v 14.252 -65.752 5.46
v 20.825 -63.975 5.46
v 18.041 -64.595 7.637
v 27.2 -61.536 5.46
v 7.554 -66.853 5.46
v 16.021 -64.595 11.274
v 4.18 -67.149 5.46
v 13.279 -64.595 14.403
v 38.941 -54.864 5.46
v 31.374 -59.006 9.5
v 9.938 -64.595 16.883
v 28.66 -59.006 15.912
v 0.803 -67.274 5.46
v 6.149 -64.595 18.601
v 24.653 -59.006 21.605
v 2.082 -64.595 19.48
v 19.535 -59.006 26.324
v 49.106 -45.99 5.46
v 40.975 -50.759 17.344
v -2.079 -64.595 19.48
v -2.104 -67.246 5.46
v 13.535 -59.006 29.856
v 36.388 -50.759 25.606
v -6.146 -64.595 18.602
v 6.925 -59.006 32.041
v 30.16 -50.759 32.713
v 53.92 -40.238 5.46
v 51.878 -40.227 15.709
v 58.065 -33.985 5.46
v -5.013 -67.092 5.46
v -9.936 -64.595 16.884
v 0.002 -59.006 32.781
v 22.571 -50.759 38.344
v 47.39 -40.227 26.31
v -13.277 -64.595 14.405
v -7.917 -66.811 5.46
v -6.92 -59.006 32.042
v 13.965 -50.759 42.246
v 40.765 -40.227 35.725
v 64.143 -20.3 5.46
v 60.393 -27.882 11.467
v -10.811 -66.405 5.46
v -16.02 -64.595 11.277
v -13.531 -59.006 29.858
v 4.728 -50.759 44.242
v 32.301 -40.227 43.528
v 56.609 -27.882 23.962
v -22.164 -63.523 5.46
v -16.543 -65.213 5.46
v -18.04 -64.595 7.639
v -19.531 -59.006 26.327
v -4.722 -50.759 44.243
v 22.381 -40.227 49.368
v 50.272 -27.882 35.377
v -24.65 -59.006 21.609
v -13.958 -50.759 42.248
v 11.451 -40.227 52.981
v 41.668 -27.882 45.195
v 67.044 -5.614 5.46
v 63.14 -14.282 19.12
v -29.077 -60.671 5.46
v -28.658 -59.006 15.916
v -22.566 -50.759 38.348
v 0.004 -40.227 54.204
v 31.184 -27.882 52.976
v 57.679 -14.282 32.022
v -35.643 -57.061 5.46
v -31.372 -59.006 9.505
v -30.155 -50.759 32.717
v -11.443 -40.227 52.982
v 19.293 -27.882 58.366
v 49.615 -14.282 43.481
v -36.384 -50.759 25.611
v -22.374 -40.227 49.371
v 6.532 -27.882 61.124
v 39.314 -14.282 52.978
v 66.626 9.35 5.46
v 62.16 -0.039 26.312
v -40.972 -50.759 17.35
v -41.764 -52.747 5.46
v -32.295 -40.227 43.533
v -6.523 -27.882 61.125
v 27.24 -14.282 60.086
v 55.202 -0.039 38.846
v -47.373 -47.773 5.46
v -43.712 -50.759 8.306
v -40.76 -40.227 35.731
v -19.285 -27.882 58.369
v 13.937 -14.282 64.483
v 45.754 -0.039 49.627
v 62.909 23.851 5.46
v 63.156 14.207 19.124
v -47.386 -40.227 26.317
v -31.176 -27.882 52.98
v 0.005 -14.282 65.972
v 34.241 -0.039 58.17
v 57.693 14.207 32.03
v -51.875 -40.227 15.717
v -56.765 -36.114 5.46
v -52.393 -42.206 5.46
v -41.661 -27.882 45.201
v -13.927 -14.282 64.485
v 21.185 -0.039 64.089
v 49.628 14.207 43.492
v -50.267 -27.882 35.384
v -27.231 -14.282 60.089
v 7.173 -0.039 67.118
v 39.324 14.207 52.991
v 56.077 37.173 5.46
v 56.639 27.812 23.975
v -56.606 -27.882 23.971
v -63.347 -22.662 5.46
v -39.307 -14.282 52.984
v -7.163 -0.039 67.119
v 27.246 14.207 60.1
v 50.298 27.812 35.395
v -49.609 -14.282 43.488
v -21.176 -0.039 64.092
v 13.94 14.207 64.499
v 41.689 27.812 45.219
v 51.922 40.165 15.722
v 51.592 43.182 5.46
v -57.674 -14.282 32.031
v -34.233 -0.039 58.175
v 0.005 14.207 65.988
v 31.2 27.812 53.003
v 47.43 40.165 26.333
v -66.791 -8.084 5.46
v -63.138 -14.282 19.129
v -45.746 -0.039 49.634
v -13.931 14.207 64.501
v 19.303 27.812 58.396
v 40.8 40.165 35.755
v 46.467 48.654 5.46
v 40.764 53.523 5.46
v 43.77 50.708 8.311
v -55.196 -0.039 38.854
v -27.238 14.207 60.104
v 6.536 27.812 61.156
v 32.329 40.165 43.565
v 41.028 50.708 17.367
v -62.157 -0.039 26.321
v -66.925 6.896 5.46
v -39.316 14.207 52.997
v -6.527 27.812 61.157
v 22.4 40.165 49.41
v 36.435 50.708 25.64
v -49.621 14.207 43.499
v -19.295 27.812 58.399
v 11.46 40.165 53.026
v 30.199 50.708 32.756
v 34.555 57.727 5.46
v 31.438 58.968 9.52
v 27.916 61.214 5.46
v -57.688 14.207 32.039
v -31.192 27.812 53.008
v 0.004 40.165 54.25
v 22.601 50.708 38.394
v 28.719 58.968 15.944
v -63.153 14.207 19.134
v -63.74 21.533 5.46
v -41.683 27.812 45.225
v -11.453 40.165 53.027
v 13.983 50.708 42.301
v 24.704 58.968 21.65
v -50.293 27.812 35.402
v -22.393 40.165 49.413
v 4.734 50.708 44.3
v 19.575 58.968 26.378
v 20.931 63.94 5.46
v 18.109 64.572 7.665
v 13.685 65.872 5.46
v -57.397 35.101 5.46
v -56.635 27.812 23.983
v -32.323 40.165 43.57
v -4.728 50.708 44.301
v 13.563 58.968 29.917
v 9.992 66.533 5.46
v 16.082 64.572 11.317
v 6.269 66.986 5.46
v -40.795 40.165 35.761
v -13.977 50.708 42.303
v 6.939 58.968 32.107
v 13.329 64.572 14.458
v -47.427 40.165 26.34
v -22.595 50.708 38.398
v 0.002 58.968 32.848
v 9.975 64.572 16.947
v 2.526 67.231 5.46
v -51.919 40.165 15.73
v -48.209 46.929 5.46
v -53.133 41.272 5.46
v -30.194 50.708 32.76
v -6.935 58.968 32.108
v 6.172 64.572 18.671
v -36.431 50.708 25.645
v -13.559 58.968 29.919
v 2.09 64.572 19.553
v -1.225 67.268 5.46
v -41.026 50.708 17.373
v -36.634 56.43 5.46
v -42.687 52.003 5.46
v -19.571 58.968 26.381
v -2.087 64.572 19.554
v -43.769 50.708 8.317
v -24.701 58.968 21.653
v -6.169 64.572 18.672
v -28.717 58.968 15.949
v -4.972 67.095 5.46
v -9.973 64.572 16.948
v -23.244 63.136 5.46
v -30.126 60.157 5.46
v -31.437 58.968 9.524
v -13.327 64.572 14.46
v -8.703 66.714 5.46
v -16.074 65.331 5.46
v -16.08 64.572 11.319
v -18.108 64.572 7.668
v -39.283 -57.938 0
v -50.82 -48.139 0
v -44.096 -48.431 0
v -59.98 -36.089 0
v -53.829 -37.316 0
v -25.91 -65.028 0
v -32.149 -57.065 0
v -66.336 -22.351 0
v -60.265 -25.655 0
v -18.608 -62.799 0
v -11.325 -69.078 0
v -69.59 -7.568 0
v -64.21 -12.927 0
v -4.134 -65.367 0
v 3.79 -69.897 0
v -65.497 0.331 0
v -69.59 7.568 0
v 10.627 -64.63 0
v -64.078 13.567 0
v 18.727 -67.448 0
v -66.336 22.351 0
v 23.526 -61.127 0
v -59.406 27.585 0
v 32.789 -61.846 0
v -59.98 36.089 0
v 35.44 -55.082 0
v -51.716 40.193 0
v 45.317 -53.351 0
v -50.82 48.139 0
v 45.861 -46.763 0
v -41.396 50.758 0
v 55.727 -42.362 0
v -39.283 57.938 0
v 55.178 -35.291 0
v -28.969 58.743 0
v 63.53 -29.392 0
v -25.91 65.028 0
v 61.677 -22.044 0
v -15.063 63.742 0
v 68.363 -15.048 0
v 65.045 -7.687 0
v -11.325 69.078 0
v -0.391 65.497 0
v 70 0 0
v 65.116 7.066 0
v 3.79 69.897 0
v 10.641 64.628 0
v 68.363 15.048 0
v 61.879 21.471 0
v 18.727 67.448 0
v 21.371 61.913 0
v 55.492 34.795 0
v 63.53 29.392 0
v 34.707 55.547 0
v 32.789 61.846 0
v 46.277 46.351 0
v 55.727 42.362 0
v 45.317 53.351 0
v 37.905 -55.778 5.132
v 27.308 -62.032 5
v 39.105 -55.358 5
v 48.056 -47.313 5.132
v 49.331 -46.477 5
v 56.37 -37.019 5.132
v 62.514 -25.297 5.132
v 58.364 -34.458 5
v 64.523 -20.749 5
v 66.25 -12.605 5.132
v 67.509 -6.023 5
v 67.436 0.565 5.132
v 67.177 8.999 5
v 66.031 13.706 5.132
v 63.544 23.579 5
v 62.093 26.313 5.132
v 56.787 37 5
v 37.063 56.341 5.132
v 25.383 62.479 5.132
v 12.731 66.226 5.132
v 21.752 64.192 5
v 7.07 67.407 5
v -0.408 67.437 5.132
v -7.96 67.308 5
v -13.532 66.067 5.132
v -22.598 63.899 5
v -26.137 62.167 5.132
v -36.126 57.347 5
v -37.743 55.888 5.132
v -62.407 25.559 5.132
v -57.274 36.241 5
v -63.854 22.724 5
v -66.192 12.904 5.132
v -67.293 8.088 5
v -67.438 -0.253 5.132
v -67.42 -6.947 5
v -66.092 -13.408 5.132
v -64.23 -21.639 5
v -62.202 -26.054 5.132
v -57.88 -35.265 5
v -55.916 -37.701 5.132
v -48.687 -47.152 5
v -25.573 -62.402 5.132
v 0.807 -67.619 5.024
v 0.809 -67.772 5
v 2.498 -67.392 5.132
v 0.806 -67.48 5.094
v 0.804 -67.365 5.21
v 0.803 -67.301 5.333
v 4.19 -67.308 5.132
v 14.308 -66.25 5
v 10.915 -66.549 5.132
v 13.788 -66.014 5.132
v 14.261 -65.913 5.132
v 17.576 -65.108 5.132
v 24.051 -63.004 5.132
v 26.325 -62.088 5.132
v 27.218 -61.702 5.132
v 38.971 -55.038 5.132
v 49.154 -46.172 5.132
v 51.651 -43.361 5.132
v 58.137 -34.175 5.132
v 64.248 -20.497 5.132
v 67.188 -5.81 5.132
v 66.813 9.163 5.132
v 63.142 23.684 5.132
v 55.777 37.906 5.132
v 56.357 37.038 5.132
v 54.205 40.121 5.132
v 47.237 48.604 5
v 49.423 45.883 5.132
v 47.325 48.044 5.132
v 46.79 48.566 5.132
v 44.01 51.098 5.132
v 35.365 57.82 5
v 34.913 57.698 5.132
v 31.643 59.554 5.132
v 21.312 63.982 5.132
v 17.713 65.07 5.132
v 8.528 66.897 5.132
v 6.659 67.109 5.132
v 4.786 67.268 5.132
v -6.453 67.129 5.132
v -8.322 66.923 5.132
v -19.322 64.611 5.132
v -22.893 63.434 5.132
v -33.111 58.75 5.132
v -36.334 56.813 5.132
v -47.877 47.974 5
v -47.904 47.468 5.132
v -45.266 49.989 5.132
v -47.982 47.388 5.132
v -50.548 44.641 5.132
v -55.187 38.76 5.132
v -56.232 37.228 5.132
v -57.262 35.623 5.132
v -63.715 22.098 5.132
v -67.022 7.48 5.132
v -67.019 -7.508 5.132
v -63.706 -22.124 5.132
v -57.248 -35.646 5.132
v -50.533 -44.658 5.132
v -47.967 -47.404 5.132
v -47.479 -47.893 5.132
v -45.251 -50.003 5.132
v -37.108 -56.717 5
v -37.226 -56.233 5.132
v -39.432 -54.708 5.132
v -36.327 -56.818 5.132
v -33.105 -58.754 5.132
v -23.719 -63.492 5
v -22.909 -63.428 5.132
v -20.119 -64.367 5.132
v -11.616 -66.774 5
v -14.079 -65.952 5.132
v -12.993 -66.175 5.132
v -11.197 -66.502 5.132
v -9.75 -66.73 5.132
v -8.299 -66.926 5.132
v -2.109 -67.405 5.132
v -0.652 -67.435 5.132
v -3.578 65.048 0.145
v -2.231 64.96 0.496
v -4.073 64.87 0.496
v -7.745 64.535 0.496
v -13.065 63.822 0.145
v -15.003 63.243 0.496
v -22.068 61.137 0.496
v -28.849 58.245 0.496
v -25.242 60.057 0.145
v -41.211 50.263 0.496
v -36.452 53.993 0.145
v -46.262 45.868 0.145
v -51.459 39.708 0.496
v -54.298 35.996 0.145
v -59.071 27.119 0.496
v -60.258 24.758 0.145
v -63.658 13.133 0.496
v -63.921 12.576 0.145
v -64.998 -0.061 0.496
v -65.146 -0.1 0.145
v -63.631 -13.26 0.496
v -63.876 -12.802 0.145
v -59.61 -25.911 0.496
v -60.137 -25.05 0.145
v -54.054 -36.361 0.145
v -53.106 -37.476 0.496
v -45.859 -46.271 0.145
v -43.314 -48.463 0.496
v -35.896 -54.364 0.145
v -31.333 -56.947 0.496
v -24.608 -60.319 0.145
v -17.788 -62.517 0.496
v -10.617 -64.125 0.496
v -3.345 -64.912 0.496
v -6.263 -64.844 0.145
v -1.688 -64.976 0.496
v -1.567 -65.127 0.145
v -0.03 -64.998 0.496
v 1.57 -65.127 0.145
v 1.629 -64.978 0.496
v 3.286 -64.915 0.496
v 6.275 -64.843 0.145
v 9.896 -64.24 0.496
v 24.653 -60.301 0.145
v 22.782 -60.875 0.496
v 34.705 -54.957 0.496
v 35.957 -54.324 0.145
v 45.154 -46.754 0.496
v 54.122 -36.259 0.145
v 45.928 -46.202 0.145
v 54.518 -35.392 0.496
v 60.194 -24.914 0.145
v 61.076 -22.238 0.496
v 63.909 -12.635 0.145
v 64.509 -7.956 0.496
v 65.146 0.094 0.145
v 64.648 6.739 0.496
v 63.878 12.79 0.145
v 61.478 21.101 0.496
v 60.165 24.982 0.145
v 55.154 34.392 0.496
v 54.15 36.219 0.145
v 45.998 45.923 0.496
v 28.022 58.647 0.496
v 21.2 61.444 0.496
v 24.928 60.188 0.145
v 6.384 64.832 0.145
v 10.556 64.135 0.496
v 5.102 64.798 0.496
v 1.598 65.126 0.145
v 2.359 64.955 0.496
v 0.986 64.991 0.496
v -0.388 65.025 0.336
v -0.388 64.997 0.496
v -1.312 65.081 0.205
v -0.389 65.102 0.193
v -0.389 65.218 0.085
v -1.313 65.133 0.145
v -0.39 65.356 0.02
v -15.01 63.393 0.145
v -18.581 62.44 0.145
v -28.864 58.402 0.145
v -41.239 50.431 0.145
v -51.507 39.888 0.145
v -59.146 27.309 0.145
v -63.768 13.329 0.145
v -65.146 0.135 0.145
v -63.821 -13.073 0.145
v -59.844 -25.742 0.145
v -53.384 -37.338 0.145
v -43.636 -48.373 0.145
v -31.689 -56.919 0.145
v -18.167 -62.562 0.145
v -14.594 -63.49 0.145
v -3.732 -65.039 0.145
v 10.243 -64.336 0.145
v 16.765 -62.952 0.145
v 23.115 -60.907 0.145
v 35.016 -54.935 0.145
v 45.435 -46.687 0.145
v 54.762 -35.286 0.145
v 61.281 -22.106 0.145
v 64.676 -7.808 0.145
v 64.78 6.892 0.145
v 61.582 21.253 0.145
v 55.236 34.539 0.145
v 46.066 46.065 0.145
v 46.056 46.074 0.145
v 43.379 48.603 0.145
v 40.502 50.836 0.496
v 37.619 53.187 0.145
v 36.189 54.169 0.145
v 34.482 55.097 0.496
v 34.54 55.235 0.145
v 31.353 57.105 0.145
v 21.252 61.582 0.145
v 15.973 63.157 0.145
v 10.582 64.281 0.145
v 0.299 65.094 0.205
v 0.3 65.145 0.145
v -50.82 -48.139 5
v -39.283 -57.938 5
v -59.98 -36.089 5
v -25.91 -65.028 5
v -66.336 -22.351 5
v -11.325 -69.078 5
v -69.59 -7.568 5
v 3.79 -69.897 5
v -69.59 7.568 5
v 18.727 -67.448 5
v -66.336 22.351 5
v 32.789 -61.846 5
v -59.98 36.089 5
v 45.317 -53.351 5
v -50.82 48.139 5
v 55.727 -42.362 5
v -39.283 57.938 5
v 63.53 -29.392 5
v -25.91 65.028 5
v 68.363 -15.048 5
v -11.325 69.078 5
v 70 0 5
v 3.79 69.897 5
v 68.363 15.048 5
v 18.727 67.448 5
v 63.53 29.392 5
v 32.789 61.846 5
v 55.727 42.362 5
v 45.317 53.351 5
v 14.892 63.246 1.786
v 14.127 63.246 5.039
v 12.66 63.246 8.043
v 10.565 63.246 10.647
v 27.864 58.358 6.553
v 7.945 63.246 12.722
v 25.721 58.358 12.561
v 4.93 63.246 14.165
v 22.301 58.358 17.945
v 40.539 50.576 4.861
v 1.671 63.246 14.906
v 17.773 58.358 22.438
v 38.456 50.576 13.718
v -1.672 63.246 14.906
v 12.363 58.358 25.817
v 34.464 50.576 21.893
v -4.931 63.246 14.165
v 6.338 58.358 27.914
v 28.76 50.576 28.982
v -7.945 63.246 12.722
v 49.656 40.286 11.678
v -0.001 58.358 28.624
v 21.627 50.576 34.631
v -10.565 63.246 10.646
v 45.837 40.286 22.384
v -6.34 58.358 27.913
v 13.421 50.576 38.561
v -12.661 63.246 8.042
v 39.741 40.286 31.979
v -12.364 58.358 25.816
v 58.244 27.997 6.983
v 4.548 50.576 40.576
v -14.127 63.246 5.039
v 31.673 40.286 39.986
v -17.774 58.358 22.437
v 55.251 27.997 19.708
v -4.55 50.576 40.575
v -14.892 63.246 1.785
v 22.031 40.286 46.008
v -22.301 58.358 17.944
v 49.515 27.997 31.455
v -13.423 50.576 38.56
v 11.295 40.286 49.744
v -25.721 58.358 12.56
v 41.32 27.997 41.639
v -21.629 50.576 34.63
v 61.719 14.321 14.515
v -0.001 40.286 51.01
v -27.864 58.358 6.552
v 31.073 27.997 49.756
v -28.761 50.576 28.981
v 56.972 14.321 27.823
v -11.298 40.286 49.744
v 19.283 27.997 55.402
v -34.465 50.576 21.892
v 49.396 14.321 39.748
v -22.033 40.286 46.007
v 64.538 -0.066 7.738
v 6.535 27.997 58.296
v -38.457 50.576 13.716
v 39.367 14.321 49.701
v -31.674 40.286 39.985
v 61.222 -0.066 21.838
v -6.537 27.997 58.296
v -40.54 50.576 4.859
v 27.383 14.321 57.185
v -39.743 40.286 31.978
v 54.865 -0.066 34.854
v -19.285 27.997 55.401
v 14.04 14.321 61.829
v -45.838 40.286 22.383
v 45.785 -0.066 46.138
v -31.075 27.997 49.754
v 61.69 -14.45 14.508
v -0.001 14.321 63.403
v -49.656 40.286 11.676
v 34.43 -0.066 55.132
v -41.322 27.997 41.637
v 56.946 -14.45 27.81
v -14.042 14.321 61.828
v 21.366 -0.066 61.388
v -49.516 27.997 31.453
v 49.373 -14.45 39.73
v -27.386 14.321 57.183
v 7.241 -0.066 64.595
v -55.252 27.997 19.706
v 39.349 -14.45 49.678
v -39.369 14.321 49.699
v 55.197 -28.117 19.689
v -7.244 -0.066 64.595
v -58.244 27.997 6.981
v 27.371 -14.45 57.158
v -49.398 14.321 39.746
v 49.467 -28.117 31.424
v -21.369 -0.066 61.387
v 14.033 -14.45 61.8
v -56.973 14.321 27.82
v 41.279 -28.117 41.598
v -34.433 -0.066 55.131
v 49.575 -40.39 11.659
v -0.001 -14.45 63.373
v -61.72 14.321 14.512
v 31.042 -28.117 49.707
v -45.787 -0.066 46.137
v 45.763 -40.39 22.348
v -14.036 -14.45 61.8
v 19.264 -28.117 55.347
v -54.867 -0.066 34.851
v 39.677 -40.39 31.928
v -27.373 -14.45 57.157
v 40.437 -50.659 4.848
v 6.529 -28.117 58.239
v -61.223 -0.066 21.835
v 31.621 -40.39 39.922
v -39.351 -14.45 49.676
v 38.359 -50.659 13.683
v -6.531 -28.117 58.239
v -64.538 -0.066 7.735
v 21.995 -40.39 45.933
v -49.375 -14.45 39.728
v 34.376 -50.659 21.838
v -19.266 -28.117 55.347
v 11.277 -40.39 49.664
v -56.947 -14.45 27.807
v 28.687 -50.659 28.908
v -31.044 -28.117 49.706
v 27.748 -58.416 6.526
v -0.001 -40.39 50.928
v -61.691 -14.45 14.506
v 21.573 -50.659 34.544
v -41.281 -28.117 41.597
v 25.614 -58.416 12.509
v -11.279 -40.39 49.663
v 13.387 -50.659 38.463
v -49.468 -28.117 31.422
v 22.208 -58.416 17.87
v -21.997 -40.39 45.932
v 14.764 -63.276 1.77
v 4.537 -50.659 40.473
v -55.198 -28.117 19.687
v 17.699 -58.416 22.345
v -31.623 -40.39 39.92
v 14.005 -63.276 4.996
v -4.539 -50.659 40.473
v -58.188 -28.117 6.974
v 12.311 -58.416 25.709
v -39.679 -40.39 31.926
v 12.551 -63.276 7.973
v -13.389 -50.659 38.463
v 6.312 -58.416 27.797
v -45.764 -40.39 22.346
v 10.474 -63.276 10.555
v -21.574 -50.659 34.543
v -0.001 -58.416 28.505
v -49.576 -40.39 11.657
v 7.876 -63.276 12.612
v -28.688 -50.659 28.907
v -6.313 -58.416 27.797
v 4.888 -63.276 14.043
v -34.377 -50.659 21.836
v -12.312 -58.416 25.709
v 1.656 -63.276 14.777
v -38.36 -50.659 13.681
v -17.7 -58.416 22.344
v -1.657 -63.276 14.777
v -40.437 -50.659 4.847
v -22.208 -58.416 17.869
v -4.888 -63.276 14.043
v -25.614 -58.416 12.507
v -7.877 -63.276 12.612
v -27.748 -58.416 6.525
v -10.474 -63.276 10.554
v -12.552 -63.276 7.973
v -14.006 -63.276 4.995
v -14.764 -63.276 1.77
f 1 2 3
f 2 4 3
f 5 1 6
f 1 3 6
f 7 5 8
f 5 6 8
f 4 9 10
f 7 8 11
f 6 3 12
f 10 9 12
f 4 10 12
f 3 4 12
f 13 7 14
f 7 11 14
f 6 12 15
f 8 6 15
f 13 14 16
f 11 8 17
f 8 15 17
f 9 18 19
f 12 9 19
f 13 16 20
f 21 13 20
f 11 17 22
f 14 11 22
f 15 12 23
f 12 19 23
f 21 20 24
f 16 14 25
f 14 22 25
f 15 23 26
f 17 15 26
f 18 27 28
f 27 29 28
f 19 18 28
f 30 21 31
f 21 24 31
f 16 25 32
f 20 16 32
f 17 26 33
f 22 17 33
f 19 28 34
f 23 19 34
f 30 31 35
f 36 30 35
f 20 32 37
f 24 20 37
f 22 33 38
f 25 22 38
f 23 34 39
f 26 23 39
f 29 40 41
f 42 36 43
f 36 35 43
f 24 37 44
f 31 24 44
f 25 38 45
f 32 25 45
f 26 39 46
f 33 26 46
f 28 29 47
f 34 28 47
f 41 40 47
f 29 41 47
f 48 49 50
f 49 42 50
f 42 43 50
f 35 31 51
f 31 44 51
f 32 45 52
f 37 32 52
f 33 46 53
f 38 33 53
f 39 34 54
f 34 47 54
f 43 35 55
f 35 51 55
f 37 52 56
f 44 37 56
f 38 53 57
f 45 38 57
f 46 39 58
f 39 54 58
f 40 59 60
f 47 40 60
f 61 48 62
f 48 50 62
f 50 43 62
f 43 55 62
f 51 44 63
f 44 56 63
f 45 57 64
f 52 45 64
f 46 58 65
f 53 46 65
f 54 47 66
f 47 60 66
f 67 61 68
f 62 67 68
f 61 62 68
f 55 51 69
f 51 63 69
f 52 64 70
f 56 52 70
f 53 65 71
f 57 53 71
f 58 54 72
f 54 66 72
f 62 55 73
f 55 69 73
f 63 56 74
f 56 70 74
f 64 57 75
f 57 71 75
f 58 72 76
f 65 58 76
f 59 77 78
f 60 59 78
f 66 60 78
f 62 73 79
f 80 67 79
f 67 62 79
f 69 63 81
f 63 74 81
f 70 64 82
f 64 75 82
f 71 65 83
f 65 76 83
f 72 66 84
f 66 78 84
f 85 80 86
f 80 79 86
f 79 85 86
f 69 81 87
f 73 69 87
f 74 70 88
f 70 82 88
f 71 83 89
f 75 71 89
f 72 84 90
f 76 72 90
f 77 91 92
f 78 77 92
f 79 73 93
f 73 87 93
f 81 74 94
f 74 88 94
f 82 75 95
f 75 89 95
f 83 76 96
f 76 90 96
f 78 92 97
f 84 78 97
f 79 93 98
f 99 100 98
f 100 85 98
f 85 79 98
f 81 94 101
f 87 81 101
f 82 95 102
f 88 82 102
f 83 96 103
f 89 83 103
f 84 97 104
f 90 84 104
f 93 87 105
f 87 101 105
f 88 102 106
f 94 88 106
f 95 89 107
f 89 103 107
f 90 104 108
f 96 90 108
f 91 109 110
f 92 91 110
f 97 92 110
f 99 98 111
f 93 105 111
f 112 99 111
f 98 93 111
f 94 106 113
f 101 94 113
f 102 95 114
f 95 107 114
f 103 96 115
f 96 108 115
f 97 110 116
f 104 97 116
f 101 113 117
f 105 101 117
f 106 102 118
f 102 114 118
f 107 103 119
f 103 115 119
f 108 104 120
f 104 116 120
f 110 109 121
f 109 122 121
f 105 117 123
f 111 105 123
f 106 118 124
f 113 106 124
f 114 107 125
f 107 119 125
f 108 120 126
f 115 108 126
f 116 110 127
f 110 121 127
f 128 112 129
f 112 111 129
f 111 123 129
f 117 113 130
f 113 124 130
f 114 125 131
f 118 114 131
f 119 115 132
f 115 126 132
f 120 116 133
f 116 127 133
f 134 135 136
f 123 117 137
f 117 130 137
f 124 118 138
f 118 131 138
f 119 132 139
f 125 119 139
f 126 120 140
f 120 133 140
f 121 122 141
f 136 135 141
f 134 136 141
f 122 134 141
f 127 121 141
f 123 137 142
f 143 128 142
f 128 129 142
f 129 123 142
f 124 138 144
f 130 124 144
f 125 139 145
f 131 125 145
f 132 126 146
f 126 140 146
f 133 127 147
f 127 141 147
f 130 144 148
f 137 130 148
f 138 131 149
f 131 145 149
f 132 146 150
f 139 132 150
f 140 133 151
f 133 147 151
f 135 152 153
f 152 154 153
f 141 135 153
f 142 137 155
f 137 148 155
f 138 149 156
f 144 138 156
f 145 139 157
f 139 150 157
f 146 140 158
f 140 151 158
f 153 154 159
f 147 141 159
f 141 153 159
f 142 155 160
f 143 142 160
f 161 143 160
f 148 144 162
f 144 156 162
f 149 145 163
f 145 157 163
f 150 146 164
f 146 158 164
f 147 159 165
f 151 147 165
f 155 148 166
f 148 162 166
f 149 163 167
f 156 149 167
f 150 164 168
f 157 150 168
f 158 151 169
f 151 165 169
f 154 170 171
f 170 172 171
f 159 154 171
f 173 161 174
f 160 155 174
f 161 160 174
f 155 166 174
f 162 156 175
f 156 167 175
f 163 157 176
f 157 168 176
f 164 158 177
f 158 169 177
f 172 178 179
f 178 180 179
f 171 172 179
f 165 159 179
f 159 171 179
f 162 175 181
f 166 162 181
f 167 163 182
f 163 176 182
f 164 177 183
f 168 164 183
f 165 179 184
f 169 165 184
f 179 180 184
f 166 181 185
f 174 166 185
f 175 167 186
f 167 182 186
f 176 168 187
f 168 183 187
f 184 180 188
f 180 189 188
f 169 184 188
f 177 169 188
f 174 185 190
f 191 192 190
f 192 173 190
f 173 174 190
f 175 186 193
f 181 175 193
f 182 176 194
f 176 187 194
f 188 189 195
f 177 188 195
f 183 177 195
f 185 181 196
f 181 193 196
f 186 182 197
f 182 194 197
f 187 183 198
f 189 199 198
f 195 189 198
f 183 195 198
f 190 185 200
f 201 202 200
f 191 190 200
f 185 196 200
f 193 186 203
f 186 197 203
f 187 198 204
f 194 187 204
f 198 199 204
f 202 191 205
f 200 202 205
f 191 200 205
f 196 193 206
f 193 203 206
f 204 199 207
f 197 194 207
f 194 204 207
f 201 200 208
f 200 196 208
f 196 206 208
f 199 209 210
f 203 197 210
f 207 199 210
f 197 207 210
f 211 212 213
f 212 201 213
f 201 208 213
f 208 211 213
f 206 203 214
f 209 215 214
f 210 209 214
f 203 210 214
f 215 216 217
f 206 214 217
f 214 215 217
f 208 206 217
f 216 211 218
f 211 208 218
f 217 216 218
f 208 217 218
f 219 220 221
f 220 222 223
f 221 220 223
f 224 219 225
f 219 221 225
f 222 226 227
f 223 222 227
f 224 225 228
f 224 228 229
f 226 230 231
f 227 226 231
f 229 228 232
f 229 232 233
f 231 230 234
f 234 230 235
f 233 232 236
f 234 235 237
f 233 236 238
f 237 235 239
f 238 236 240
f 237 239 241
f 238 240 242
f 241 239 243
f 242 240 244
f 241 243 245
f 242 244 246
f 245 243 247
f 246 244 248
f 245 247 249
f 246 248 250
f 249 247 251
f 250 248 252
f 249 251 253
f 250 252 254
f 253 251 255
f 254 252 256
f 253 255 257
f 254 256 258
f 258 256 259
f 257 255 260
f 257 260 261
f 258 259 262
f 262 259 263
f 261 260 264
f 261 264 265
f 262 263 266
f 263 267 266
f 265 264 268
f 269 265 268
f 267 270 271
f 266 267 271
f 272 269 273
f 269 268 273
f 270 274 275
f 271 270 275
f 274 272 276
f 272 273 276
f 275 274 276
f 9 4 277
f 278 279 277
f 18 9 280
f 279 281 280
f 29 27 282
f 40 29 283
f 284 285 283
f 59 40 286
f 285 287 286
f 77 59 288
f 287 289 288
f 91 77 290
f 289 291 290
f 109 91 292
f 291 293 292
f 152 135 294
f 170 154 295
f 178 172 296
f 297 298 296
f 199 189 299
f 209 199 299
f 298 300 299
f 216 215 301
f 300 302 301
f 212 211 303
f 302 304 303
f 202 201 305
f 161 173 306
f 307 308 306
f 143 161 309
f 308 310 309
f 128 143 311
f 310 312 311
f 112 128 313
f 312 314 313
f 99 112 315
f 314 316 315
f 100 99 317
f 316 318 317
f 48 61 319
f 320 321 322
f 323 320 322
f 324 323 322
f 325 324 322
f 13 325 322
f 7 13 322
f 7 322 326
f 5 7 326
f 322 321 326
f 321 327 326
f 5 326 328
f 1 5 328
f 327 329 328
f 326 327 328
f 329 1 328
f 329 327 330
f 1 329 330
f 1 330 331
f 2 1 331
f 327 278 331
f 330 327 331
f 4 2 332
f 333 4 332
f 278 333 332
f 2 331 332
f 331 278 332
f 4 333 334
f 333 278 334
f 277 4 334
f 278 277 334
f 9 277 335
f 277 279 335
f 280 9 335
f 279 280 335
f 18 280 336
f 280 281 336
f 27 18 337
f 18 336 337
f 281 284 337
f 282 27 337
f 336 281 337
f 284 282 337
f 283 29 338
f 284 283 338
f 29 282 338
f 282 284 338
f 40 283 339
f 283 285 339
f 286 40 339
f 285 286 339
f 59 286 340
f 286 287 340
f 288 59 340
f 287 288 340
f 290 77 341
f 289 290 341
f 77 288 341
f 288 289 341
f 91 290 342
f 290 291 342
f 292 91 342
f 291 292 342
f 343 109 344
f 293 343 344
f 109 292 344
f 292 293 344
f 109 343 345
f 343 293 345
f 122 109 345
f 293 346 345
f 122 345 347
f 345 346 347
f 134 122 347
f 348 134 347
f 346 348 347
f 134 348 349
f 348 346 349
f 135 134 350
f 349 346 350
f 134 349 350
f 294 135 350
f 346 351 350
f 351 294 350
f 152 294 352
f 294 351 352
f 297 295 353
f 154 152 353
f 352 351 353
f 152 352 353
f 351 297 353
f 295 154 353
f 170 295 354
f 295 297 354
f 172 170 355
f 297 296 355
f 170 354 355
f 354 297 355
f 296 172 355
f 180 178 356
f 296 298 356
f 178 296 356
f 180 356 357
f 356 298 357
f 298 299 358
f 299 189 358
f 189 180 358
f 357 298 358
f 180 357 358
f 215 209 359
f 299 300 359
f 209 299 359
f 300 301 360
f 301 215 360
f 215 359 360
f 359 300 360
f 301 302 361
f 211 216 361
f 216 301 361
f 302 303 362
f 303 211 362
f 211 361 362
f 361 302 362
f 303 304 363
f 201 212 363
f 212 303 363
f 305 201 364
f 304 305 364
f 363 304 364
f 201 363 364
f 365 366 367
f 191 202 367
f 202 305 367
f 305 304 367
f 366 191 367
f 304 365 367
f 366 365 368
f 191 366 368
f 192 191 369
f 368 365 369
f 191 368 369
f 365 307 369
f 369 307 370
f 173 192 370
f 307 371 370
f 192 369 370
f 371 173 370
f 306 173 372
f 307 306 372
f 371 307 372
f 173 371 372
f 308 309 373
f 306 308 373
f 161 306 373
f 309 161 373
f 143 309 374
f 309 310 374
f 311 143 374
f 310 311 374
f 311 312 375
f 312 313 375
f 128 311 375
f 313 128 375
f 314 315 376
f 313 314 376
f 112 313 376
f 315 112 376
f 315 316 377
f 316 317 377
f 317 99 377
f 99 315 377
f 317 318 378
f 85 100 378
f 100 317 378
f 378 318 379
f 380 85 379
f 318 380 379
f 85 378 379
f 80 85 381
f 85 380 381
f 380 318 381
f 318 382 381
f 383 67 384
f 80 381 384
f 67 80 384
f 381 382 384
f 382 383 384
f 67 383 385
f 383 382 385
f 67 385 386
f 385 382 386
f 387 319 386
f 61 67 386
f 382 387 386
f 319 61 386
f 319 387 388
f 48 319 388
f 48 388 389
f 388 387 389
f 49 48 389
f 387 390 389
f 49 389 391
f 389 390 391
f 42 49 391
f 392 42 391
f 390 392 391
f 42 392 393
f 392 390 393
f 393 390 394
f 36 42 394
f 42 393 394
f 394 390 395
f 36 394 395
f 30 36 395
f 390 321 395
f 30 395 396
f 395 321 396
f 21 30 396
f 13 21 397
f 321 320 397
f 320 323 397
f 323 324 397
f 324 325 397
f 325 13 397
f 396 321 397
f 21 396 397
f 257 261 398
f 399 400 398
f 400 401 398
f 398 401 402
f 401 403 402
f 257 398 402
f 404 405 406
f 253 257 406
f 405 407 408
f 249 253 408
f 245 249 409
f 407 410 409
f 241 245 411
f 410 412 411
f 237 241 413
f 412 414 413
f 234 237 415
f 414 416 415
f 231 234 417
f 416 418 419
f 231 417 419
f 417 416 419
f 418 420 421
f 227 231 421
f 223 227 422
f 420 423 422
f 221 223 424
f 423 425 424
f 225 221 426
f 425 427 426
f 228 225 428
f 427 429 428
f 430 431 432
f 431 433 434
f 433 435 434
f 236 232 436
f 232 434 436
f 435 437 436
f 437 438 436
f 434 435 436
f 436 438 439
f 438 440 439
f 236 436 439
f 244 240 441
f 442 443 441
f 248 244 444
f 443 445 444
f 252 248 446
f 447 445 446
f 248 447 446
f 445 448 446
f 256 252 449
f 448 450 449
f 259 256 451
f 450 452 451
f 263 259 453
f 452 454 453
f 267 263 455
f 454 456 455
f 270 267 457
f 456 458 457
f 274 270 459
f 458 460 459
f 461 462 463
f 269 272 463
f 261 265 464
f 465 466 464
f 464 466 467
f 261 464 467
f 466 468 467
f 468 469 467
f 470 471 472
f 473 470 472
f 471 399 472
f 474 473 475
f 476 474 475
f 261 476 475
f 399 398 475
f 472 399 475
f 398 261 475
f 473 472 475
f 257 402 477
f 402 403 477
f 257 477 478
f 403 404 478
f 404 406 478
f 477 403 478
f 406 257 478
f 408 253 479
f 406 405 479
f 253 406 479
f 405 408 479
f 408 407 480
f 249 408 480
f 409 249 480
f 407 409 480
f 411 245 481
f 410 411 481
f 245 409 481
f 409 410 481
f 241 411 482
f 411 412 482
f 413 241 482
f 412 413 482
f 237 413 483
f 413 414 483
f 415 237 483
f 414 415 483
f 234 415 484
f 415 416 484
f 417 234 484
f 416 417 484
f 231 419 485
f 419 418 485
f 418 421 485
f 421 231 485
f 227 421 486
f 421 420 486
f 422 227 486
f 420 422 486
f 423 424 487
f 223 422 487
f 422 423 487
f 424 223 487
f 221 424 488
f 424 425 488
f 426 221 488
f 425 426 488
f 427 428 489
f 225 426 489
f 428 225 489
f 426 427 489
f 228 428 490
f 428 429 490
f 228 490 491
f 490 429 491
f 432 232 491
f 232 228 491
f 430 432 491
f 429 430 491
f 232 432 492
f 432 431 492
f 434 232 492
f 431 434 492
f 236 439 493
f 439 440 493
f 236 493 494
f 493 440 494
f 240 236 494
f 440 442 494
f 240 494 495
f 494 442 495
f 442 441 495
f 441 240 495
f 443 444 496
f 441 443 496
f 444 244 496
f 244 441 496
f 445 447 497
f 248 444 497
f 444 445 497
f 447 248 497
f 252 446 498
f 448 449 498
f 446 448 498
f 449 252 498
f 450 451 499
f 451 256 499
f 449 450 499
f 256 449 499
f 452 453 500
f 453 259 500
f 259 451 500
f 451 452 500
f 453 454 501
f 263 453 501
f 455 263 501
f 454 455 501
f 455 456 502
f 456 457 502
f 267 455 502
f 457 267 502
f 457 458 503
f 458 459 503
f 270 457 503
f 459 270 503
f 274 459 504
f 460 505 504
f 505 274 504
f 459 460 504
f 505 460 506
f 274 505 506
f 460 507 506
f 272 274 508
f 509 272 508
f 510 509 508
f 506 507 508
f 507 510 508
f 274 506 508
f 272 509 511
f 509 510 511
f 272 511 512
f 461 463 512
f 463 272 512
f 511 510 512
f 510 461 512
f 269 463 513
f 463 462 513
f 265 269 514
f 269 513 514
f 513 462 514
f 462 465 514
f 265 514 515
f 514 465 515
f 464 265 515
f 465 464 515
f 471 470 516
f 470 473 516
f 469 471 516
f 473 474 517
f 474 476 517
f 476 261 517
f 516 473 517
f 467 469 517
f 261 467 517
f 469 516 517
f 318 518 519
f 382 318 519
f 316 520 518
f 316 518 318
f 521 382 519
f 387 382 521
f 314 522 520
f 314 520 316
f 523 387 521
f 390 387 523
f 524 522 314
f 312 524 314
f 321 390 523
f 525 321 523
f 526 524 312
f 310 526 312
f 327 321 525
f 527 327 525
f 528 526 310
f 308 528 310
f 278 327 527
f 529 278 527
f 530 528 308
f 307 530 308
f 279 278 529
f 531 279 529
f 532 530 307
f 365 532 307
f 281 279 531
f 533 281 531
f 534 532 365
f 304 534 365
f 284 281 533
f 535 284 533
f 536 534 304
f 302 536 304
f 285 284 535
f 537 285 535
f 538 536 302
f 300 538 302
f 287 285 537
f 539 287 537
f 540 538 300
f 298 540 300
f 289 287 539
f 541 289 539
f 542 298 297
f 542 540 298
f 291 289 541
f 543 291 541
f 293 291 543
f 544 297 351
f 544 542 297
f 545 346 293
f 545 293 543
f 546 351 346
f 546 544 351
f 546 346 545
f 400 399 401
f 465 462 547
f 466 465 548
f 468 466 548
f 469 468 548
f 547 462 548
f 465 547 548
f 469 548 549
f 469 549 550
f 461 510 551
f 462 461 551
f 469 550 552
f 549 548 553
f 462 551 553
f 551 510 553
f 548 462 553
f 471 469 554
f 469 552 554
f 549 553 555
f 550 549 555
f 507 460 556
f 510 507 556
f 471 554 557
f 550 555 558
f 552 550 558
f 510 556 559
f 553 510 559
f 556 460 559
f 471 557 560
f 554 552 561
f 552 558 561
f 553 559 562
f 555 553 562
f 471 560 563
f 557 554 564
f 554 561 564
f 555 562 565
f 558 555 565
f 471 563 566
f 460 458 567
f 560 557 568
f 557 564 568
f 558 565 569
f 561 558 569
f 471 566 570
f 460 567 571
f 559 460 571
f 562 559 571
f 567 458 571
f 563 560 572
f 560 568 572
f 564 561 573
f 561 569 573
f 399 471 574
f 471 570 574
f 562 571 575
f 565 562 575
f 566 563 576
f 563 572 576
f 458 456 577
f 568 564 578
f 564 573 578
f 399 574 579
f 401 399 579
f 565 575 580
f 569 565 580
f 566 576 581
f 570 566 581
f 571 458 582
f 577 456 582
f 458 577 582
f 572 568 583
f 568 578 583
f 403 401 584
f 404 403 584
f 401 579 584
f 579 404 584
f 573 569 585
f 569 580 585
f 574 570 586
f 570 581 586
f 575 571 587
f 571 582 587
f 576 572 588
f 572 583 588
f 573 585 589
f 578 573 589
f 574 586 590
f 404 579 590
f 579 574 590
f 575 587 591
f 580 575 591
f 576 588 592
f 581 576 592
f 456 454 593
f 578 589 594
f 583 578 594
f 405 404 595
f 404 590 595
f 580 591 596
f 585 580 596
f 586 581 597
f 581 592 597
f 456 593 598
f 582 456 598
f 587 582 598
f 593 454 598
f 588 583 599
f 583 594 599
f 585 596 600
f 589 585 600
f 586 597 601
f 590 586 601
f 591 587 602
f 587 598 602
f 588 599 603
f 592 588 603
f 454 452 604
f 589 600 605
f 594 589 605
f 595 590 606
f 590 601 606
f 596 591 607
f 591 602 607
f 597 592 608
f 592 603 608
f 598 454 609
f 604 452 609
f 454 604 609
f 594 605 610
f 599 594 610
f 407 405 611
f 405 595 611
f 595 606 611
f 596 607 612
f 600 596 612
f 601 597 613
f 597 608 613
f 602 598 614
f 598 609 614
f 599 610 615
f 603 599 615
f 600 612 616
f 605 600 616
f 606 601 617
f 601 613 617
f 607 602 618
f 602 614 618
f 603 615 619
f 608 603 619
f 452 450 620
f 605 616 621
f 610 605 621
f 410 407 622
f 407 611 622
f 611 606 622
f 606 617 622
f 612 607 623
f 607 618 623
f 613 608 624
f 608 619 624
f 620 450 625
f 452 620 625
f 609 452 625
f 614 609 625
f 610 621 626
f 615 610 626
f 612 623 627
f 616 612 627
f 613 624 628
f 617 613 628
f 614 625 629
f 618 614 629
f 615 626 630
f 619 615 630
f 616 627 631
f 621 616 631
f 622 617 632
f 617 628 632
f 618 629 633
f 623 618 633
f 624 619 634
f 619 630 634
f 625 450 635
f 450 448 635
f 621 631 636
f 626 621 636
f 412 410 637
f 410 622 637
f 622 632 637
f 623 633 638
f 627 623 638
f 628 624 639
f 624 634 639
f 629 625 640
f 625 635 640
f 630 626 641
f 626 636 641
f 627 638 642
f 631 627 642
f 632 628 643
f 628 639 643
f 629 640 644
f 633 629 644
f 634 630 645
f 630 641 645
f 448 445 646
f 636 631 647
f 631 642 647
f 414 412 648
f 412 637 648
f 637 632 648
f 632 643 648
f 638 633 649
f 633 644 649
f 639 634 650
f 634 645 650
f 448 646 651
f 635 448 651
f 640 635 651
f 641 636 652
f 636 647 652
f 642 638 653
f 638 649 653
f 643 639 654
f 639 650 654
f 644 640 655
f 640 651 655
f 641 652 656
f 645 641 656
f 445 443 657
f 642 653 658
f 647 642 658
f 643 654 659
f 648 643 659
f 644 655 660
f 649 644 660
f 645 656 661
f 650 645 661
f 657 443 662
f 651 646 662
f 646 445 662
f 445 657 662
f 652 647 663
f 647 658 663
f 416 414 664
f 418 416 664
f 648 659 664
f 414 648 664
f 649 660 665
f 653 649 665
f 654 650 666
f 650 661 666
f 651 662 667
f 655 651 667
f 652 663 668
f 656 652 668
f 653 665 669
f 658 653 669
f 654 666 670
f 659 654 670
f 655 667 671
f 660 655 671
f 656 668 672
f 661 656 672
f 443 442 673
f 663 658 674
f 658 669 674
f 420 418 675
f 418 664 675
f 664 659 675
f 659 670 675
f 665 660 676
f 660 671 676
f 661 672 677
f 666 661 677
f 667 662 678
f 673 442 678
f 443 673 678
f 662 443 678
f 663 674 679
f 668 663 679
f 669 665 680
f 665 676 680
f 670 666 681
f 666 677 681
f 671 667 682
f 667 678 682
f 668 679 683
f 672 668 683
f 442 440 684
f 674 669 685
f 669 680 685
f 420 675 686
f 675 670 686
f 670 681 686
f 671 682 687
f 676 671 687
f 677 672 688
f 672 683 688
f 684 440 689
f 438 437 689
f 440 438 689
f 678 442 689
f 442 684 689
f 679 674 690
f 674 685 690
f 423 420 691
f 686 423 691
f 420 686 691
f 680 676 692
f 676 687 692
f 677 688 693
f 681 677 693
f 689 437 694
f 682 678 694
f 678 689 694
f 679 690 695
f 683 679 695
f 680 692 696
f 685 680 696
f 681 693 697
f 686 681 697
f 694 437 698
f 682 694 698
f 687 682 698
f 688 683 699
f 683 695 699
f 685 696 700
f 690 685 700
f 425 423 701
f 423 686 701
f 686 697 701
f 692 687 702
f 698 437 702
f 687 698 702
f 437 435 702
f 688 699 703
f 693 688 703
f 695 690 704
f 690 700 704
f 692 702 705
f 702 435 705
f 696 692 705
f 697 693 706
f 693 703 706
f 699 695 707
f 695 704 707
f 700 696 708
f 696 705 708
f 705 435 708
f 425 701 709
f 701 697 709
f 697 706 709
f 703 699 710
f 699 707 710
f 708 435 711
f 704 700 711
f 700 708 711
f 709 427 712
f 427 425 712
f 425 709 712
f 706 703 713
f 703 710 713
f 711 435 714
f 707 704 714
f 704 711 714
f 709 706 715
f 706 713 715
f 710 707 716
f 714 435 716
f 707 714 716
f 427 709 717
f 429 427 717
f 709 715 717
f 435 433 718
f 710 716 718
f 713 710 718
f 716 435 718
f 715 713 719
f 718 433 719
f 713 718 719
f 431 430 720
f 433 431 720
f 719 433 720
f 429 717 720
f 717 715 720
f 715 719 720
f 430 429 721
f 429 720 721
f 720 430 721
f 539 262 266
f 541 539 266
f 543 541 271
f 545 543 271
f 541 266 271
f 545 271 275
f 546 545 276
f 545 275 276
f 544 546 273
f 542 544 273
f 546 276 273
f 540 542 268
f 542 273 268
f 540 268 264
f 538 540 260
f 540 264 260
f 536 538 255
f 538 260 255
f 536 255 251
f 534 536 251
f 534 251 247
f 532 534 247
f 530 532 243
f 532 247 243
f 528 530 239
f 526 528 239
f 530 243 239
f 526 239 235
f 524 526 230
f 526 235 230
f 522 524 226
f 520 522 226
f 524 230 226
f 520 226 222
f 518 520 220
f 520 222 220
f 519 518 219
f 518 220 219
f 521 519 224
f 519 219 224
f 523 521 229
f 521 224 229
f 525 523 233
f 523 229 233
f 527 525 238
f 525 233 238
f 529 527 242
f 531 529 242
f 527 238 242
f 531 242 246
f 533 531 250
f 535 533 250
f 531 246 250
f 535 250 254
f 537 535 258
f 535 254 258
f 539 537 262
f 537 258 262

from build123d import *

# Parameters (mm, degrees)
SKETCH1_R           = 70
SKETCH1_R_2         = 65
BOSS_EXTRUDE1_DEPTH = 5
REVOLVE1_ANGLE      = 180
FILLET1_R           = 0.5


with BuildPart() as part:
    # Sketch1 → Boss-Extrude1 (new body)
    with BuildSketch(Plane.XY):
        Circle(SKETCH1_R)
        Circle(SKETCH1_R_2, mode=Mode.SUBTRACT)
    extrude(amount=BOSS_EXTRUDE1_DEPTH)

    # Sketch2 → Revolve1 (revolve)
    with BuildSketch(Plane.XY):
        with BuildLine():
            Line((0, 67.5), (0, 65))
            ThreePointArc((0, 65), (65, 0), (0, -65))
            Line((0, -65), (0, -67.5))
            ThreePointArc((0, -67.5), (67.5, 0), (0, 67.5))
        make_face()
    revolve(axis=Axis((0, 67.5, 0), (0, -1, 0)), revolution_arc=REVOLVE1_ANGLE)

    # Fillet1
    fillet1_edges = [part.edges().sort_by_distance(p)[0] for p in [
        (0, 67.314560089, 5),
        (-65, 0, 0),
    ]]
    fillet(fillet1_edges, radius=FILLET1_R)


solid = part.part
